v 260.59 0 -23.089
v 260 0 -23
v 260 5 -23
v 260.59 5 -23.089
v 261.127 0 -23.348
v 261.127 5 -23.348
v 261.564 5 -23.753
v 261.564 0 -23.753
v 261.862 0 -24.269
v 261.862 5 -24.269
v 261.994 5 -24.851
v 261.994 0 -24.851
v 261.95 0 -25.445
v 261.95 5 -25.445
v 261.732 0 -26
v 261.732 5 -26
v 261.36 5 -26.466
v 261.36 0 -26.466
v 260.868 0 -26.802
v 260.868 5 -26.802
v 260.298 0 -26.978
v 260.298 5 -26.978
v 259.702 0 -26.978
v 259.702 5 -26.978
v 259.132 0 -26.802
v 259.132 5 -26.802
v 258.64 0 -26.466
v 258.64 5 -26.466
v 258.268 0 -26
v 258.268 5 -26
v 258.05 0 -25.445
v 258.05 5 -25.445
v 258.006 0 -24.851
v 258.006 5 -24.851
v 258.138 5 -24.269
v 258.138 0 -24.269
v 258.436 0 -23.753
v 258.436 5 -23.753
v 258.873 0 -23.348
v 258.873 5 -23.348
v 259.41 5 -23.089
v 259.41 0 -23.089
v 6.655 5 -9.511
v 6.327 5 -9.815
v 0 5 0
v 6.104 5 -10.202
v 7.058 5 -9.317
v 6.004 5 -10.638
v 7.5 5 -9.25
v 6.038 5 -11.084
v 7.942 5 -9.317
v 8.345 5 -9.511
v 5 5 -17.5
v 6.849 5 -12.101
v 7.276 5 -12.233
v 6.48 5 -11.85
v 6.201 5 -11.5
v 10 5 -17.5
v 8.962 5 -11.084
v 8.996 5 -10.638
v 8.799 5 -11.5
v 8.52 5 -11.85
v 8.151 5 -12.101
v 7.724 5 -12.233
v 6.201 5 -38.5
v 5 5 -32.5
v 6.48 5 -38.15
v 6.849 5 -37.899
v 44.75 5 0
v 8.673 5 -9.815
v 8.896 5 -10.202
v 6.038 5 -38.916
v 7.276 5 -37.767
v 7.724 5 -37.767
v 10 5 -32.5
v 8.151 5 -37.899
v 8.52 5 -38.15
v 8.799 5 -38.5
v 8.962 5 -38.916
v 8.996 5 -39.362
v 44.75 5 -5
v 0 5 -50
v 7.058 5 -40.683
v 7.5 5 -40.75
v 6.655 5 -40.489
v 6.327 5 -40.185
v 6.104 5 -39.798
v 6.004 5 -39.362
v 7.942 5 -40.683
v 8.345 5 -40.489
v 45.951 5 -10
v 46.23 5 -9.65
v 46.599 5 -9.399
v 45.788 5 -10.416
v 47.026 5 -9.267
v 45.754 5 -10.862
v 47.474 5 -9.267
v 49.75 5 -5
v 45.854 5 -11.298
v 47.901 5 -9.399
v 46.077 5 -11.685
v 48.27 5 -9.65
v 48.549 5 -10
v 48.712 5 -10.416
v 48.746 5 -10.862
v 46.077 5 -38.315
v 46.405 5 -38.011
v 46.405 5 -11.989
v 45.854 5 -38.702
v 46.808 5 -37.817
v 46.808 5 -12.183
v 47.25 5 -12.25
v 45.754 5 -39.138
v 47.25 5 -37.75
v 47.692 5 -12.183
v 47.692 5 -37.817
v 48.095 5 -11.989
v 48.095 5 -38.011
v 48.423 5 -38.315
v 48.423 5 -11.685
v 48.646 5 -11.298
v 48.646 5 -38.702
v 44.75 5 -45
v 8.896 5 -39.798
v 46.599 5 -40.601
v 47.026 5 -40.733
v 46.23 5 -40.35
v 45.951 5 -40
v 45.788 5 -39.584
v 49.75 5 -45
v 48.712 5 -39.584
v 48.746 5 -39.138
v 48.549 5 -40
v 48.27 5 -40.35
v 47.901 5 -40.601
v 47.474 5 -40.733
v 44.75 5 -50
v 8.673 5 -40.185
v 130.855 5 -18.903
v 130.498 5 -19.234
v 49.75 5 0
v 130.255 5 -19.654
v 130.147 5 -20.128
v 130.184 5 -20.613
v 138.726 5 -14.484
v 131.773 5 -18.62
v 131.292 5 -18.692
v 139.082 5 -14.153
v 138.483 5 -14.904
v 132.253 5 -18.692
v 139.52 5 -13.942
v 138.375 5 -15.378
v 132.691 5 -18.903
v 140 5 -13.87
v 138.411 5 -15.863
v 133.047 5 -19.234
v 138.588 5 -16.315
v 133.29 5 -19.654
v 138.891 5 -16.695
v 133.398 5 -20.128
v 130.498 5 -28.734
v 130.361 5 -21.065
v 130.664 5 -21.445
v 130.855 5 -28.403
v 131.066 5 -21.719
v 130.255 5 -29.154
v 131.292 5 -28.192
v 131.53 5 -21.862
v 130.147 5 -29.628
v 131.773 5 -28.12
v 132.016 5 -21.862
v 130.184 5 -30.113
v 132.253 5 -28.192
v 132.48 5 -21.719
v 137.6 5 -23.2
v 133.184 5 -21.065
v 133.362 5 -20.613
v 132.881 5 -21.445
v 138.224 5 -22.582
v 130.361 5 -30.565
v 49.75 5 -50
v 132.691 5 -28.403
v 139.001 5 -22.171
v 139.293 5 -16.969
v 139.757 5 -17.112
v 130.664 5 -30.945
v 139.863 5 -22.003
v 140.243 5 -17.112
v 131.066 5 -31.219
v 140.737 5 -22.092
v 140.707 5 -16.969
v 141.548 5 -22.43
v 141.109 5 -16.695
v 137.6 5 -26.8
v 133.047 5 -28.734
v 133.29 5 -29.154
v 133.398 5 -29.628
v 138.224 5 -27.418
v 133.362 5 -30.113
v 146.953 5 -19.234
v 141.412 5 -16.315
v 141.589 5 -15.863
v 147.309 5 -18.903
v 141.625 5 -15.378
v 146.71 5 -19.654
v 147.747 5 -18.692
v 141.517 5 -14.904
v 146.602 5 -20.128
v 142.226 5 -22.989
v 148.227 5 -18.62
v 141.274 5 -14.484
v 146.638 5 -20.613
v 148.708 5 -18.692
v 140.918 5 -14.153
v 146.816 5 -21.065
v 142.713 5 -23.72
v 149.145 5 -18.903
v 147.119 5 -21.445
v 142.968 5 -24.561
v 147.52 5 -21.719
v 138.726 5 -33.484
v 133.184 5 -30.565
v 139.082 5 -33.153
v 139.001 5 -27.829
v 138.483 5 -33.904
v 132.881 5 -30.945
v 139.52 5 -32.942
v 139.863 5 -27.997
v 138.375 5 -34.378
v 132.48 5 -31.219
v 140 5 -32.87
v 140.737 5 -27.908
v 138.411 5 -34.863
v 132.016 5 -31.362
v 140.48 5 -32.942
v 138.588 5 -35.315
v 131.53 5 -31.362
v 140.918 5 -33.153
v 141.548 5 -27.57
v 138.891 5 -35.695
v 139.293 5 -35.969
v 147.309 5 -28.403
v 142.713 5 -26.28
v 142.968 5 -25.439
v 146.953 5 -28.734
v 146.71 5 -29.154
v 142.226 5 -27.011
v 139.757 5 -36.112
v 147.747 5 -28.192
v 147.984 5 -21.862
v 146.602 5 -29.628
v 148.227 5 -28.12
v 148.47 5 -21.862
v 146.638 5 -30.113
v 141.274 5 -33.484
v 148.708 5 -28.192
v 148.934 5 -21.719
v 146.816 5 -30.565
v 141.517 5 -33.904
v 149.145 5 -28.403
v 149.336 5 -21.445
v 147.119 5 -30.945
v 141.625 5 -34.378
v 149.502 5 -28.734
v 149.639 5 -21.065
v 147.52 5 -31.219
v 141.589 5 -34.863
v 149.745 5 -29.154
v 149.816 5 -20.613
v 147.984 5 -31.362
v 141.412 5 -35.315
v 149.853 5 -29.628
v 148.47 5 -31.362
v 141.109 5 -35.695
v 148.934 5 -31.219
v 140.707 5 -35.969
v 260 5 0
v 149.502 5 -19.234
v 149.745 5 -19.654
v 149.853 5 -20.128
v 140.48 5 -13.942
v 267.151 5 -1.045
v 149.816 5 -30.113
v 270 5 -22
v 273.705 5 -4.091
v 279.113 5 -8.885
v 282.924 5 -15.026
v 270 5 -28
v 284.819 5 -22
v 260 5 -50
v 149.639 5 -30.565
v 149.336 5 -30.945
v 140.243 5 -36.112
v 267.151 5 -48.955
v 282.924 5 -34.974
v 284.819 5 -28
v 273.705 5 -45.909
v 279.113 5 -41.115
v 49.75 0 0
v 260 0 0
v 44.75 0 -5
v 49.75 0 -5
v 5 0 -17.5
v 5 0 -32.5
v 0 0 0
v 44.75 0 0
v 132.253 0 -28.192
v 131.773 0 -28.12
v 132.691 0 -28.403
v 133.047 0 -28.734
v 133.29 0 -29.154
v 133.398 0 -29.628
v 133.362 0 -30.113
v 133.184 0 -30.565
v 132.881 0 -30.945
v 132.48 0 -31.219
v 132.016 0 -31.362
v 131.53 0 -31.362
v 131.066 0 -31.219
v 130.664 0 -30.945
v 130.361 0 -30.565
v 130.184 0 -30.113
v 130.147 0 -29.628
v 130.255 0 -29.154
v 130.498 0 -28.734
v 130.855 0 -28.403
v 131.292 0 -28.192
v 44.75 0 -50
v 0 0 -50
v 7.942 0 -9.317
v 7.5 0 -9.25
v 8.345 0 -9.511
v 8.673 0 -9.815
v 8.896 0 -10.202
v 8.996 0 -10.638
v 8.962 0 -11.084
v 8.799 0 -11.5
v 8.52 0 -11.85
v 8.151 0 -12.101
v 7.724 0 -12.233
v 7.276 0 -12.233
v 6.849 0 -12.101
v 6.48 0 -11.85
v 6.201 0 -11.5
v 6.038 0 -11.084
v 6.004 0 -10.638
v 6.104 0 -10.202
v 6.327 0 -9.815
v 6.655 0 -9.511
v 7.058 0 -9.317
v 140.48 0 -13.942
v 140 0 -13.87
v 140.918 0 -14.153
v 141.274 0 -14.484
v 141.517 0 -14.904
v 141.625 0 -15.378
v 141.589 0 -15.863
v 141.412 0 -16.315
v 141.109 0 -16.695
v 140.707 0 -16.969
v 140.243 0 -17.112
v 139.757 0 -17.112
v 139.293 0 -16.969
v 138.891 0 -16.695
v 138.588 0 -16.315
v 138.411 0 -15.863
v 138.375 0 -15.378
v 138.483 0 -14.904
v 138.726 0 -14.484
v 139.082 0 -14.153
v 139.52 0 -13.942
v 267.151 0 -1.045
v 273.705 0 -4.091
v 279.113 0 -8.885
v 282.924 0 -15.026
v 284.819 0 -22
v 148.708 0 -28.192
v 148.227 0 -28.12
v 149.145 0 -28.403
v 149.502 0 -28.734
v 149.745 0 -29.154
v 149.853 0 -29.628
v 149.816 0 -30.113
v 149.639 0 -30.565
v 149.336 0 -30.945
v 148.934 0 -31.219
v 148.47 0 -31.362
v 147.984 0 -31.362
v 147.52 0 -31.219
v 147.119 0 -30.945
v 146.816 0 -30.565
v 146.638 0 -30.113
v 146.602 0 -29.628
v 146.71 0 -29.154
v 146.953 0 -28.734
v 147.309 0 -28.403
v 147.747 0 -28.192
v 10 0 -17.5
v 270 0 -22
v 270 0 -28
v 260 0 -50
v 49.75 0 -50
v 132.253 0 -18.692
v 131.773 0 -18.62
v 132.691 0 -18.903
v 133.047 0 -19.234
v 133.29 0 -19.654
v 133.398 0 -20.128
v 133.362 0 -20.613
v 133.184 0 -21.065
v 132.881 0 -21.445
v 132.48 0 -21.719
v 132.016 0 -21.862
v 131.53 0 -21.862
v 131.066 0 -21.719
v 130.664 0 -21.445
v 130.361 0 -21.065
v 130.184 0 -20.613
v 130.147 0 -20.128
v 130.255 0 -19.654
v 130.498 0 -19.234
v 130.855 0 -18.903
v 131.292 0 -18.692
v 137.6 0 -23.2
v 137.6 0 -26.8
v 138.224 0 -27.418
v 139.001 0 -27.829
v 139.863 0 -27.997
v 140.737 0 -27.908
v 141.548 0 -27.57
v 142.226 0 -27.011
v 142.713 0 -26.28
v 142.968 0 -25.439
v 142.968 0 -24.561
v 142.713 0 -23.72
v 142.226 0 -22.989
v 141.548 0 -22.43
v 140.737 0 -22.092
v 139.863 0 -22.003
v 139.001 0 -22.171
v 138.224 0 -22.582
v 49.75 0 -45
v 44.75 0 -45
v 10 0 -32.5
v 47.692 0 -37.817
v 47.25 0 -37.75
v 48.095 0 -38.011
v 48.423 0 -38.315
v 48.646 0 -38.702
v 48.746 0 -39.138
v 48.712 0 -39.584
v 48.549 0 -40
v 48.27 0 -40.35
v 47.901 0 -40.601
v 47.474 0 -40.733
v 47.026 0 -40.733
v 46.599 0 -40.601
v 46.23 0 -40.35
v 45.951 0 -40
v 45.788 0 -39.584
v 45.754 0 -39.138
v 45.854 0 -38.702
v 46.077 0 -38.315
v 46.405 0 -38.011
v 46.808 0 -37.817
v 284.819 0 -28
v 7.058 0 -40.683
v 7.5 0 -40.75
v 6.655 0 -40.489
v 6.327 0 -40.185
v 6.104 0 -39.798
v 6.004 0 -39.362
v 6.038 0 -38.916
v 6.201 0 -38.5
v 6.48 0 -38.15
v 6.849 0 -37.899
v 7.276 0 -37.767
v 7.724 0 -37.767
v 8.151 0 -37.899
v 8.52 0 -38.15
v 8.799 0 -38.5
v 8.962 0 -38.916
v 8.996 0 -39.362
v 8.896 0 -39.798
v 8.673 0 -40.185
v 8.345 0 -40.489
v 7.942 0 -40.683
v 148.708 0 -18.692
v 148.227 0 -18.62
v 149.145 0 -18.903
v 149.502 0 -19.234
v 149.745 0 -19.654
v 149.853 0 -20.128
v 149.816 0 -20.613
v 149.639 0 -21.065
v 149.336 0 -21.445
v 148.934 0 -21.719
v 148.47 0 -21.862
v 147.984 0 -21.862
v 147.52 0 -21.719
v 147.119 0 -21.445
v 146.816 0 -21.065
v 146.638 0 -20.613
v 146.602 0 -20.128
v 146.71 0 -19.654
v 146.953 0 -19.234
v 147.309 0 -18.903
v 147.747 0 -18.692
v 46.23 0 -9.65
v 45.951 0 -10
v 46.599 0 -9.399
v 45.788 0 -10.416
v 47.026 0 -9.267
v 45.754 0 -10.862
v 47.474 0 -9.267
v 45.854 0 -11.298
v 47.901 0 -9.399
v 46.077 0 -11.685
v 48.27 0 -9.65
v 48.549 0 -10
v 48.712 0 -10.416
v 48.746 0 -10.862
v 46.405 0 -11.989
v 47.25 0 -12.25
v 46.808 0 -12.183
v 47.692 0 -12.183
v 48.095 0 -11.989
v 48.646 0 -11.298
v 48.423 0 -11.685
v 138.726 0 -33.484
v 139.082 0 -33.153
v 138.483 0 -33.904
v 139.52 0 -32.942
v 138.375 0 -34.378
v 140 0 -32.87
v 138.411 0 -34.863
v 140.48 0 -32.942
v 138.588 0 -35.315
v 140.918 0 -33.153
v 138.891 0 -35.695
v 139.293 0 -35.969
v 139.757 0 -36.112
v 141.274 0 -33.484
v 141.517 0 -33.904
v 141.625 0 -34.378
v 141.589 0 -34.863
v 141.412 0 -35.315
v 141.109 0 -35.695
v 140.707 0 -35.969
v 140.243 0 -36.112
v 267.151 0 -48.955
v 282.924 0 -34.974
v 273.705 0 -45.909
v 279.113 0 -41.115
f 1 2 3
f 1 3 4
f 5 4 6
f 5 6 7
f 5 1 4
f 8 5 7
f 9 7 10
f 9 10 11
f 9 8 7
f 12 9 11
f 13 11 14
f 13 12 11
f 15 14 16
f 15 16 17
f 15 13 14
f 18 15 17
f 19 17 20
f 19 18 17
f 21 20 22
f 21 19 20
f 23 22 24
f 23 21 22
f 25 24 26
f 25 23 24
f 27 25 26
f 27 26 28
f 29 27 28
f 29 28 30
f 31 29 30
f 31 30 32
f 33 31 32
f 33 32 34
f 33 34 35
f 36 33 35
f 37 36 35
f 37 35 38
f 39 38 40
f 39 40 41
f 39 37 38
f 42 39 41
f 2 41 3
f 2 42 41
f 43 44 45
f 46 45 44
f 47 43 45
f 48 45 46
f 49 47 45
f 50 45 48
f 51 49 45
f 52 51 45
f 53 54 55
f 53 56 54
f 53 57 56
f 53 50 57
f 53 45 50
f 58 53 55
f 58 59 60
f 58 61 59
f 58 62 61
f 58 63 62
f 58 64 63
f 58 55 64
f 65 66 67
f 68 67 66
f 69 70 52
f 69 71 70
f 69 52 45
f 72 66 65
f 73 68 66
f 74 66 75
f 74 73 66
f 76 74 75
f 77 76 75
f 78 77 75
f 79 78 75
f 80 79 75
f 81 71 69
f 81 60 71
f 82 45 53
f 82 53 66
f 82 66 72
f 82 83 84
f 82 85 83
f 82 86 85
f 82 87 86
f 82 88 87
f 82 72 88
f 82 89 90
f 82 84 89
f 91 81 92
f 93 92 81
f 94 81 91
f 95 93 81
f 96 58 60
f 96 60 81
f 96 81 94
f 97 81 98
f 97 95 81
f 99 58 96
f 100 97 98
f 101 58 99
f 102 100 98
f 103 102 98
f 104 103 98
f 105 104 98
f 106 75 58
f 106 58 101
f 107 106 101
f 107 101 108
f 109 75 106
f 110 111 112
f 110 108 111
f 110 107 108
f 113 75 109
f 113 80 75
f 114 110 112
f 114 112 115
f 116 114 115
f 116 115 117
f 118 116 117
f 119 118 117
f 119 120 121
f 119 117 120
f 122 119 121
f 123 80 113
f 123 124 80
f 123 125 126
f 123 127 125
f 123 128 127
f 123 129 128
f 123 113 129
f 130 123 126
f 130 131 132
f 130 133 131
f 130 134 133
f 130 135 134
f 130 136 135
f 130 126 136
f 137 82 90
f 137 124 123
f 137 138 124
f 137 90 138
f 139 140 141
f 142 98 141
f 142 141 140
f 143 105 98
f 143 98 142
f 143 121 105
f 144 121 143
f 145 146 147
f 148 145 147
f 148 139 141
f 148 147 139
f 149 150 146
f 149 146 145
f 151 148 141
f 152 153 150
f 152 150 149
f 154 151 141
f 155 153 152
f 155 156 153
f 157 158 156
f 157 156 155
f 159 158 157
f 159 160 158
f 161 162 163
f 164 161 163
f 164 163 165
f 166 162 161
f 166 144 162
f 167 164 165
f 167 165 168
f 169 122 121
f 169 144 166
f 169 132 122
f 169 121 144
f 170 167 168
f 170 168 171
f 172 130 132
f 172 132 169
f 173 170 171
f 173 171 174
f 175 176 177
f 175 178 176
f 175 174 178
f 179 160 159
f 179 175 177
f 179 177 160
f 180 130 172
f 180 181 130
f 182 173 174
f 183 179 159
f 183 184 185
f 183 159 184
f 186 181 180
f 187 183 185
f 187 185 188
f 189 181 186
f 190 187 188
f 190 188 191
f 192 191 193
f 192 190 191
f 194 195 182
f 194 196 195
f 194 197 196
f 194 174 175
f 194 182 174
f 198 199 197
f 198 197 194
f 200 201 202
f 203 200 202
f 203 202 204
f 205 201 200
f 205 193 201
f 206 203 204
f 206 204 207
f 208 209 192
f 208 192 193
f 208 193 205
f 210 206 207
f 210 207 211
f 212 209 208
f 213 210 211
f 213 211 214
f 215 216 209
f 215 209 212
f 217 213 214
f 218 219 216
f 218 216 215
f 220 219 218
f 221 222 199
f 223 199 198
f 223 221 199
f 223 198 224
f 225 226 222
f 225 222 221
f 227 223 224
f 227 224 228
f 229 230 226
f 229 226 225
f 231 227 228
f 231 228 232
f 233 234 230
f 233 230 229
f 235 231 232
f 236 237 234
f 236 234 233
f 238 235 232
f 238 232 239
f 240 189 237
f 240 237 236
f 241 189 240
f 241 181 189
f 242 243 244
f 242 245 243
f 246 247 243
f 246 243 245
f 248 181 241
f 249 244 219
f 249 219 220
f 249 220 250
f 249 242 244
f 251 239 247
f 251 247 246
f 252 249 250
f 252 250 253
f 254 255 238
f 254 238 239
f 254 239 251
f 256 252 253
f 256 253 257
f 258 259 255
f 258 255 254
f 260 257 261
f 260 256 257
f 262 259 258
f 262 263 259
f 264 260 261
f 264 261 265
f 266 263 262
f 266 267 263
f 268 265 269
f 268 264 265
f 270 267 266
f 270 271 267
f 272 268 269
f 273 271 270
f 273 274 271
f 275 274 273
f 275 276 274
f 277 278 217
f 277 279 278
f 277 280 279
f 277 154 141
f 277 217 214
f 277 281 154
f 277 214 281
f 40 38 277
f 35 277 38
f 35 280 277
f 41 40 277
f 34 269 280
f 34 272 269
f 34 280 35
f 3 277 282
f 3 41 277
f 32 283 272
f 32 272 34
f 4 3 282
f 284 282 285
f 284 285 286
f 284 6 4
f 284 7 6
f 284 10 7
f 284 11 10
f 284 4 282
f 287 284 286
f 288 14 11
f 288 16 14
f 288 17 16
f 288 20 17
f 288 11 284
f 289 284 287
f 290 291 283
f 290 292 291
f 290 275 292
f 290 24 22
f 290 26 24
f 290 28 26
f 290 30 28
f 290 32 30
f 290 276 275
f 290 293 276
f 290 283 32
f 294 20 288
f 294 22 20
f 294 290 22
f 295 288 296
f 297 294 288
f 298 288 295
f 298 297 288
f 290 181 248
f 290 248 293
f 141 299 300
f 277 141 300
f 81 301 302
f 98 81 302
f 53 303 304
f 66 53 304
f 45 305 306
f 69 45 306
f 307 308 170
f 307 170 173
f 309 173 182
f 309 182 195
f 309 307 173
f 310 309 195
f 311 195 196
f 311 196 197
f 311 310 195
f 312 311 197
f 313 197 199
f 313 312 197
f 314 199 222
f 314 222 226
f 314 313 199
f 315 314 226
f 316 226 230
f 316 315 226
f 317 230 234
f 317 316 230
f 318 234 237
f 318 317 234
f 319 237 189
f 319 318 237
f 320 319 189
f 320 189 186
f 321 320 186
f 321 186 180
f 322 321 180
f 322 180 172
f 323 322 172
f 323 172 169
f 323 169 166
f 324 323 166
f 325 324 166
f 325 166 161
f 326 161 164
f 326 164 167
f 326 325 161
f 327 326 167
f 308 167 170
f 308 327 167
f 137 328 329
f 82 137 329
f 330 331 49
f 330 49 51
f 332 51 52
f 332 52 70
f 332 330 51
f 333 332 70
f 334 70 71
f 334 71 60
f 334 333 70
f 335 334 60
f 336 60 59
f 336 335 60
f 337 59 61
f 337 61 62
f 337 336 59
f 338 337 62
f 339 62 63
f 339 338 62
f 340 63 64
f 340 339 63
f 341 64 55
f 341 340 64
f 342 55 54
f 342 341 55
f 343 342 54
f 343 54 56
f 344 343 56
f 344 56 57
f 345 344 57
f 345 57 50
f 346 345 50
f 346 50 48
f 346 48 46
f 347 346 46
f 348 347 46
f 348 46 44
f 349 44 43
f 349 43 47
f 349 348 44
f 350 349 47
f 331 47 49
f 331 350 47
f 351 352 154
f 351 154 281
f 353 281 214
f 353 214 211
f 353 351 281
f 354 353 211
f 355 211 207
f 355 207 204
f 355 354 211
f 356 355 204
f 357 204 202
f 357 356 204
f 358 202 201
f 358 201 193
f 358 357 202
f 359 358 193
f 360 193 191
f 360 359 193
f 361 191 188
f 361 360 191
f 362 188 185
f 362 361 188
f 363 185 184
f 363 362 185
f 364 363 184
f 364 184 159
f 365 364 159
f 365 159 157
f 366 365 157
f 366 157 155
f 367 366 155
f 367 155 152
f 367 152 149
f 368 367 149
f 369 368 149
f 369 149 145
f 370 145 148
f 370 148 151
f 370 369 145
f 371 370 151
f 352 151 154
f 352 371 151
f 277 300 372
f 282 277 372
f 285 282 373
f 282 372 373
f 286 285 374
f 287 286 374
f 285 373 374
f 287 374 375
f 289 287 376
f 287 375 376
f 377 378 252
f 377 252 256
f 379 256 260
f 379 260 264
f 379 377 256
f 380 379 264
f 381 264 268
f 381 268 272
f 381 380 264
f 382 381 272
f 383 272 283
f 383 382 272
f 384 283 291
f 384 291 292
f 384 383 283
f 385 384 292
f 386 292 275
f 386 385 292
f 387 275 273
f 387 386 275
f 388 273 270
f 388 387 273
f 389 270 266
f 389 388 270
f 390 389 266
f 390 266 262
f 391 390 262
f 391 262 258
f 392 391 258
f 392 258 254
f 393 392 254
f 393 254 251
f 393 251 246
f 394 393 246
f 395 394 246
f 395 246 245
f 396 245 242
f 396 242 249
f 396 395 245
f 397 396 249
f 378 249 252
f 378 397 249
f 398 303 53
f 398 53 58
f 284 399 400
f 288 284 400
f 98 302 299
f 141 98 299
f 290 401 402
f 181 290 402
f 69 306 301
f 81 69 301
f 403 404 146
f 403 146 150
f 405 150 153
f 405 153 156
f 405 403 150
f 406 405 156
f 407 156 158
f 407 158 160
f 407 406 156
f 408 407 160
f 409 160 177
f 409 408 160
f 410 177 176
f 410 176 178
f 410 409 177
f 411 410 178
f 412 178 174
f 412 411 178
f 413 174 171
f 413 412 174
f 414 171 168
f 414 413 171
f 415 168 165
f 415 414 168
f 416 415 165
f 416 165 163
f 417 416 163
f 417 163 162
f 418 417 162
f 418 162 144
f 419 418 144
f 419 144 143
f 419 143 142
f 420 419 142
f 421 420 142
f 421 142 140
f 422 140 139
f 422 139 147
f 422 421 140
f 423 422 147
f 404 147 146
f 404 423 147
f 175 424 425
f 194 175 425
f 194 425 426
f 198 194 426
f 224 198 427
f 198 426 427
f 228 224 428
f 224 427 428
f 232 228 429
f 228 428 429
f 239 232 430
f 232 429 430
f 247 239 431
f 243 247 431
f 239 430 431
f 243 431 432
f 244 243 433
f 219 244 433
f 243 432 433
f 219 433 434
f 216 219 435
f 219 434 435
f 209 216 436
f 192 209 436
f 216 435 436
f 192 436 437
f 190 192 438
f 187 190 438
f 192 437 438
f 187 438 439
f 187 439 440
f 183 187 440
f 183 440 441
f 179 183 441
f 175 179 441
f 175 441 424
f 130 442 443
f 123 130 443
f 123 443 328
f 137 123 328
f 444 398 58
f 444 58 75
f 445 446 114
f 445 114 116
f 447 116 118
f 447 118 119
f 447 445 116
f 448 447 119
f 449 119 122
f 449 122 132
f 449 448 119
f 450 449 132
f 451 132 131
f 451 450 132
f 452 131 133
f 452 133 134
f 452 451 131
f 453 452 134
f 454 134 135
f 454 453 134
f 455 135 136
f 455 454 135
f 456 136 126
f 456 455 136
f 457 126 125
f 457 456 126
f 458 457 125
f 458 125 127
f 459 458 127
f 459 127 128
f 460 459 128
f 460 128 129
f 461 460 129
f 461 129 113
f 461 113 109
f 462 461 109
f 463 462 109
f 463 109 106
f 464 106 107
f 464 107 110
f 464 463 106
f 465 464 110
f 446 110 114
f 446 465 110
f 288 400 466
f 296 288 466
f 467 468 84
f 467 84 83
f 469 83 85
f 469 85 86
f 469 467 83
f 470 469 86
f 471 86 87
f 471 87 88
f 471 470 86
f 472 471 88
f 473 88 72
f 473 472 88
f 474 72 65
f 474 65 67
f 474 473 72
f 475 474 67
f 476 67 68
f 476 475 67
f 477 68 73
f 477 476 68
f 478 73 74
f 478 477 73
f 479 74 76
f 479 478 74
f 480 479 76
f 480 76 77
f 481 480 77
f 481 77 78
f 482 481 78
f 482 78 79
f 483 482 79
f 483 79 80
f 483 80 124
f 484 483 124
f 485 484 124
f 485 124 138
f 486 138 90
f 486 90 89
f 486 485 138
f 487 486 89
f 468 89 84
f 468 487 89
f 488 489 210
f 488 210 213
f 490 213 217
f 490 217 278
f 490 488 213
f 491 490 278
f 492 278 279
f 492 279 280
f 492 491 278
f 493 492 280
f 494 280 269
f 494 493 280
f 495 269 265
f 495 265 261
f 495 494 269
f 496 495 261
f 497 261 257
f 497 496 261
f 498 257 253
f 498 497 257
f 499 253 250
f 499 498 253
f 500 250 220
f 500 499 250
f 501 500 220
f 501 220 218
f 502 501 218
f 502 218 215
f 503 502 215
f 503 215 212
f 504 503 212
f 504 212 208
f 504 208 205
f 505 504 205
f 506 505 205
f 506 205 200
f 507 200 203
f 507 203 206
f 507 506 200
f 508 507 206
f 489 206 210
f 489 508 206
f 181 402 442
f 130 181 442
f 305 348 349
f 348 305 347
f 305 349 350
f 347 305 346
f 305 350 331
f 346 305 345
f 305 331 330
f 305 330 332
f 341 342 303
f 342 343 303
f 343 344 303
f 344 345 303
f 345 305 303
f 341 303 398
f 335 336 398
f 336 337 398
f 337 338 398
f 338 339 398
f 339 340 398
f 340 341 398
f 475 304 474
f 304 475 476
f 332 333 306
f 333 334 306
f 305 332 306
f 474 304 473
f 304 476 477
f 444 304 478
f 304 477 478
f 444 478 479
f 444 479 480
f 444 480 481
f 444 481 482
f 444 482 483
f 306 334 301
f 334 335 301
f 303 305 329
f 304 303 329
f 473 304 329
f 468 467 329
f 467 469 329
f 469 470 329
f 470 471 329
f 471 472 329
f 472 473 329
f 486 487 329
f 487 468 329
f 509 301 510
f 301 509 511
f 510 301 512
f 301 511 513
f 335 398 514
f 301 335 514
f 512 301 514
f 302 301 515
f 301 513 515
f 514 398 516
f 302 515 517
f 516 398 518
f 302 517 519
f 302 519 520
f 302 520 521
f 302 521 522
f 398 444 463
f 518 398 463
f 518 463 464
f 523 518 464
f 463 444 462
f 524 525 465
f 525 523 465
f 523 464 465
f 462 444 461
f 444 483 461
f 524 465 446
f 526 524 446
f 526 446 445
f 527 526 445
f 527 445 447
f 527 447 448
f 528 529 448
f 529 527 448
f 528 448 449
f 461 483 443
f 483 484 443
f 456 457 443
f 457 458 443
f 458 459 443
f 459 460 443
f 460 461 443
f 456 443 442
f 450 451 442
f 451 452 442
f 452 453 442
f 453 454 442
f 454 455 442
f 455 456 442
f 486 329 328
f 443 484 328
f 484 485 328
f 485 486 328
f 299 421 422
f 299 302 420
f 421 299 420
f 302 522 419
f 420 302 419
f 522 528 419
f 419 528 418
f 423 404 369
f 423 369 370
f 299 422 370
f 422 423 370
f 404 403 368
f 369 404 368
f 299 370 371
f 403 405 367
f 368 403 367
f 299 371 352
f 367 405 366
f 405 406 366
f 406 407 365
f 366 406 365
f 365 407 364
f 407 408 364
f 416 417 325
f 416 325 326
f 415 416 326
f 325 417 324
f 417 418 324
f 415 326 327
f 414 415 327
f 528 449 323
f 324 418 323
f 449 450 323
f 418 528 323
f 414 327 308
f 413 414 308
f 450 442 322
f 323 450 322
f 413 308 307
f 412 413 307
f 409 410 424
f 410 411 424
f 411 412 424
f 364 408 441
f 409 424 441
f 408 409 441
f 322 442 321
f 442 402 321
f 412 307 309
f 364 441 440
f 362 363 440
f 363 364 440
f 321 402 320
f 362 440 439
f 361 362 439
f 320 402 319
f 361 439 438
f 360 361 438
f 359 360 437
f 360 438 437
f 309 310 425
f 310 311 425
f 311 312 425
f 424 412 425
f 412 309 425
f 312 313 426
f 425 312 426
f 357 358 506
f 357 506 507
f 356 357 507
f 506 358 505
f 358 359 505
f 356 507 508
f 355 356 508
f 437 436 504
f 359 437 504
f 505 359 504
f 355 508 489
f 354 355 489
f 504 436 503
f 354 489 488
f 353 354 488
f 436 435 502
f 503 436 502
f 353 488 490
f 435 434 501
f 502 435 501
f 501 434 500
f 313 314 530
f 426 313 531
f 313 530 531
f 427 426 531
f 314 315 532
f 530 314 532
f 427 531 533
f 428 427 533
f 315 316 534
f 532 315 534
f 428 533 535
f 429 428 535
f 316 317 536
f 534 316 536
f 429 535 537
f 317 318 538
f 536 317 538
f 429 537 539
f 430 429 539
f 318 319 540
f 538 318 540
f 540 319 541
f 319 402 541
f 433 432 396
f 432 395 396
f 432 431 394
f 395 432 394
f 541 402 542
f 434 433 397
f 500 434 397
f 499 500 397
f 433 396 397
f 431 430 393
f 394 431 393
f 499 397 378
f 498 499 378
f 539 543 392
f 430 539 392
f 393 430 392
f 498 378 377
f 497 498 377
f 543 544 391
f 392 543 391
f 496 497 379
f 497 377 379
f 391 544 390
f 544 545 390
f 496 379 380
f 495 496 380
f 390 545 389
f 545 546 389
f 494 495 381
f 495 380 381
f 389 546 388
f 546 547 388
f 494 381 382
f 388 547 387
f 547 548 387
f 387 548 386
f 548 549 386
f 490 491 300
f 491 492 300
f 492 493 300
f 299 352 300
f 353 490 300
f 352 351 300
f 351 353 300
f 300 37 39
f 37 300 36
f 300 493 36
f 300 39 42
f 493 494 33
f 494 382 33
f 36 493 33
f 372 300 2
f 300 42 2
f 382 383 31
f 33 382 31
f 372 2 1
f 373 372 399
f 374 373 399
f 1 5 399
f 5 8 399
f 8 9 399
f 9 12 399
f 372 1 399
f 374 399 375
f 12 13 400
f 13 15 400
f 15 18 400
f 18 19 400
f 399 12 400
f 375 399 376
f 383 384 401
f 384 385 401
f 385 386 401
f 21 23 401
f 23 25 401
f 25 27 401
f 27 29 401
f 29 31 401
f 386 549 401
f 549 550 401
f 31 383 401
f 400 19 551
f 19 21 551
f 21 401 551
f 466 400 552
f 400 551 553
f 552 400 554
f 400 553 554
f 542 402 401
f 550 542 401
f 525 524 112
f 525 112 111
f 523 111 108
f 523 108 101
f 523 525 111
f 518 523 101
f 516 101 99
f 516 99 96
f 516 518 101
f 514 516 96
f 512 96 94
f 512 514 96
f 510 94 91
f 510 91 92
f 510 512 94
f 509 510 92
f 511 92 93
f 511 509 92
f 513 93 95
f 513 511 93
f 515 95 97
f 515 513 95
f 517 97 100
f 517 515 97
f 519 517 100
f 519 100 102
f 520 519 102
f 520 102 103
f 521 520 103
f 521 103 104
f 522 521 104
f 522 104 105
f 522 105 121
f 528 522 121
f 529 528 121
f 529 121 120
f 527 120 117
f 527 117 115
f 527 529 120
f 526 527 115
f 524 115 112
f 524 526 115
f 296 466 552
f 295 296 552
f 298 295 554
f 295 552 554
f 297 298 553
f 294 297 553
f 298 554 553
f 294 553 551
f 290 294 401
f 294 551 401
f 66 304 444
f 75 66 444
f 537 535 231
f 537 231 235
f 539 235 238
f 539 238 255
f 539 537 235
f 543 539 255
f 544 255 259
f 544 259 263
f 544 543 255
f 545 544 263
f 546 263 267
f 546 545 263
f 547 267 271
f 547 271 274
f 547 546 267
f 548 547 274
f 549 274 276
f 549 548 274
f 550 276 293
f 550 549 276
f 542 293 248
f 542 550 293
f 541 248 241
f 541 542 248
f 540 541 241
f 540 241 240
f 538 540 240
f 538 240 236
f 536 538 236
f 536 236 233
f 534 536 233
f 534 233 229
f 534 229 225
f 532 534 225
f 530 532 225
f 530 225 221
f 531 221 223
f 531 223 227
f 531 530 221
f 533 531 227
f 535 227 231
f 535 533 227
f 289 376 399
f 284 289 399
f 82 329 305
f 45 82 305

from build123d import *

# Parameters (mm, degrees)
CROQUIS1_R              = 1.5
CROQUIS1_R_2            = 1.63
CROQUIS1_R_3            = 2
CROQUIS1_W              = 5
CROQUIS1_H              = 15
SALIENTE_EXTRUIR1_DEPTH = 5


with BuildPart() as part:
    # Croquis1 → Saliente-Extruir1 (new body)
    with BuildSketch(Plane(origin=(0, 0, 0), x_dir=(1, 0, 0), z_dir=(0, 1, 0))):
        with BuildLine():
            Line((0, 0), (44.75, 0))
            Line((44.75, 0), (44.75, 5))
            Line((44.75, 5), (49.75, 5))
            Line((49.75, 5), (49.75, 0))
            Line((49.75, 0), (260, 0))
            ThreePointArc((260, 0), (276.583123952, 6.291713066), (284.819347292, 22))
            Line((284.819347292, 22), (270, 22))
            Line((270, 22), (270, 28))
            Line((270, 28), (284.819347292, 28))
            ThreePointArc((284.819347292, 28), (276.583123952, 43.708286934), (260, 50))
            Line((260, 50), (49.75, 50))
            Line((49.75, 50), (49.75, 45))
            Line((49.75, 45), (44.75, 45))
            Line((44.75, 45), (44.75, 50))
            Line((44.75, 50), (0, 50))
            Line((0, 50), (0, 0))
        make_face()
        with Locations(Location((47.25, 39.25, 0), (0, 0, 270))):
            Circle(CROQUIS1_R, mode=Mode.SUBTRACT)
        with Locations(Location((140, 34.5, 0), (0, 0, 270))):
            Circle(CROQUIS1_R_2, mode=Mode.SUBTRACT)
        with Locations(Location((47.25, 10.75, 0), (0, 0, 90))):
            Circle(CROQUIS1_R, mode=Mode.SUBTRACT)
        with Locations(Location((7.5, 10.75, 0), (0, 0, 270))):
            Circle(CROQUIS1_R, mode=Mode.SUBTRACT)
        with Locations(Location((7.5, 39.25, 0), (0, 0, 90))):
            Circle(CROQUIS1_R, mode=Mode.SUBTRACT)
        with Locations(Location((131.772758664, 29.75, 0), (0, 0, 270))):
            Circle(CROQUIS1_R_2, mode=Mode.SUBTRACT)
        with Locations(Location((131.772758664, 20.25, 0), (0, 0, 270))):
            Circle(CROQUIS1_R_2, mode=Mode.SUBTRACT)
        with Locations(Location((140, 15.5, 0), (0, 0, 270))):
            Circle(CROQUIS1_R_2, mode=Mode.SUBTRACT)
        with Locations(Location((148.227241336, 20.25, 0), (0, 0, 270))):
            Circle(CROQUIS1_R_2, mode=Mode.SUBTRACT)
        with Locations(Location((148.227241336, 29.75, 0), (0, 0, 270))):
            Circle(CROQUIS1_R_2, mode=Mode.SUBTRACT)
        with Locations(Location((260, 25, 0), (0, 0, 270))):
            Circle(CROQUIS1_R_3, mode=Mode.SUBTRACT)
        with Locations((7.5, 25)):
            Rectangle(CROQUIS1_W, CROQUIS1_H, mode=Mode.SUBTRACT)
        with BuildLine():
            Line((137.6, 23.2), (137.6, 26.8))
            ThreePointArc((137.6, 26.8), (143, 25), (137.6, 23.2))
        make_face(mode=Mode.SUBTRACT)
    extrude(amount=SALIENTE_EXTRUIR1_DEPTH)


solid = part.part
